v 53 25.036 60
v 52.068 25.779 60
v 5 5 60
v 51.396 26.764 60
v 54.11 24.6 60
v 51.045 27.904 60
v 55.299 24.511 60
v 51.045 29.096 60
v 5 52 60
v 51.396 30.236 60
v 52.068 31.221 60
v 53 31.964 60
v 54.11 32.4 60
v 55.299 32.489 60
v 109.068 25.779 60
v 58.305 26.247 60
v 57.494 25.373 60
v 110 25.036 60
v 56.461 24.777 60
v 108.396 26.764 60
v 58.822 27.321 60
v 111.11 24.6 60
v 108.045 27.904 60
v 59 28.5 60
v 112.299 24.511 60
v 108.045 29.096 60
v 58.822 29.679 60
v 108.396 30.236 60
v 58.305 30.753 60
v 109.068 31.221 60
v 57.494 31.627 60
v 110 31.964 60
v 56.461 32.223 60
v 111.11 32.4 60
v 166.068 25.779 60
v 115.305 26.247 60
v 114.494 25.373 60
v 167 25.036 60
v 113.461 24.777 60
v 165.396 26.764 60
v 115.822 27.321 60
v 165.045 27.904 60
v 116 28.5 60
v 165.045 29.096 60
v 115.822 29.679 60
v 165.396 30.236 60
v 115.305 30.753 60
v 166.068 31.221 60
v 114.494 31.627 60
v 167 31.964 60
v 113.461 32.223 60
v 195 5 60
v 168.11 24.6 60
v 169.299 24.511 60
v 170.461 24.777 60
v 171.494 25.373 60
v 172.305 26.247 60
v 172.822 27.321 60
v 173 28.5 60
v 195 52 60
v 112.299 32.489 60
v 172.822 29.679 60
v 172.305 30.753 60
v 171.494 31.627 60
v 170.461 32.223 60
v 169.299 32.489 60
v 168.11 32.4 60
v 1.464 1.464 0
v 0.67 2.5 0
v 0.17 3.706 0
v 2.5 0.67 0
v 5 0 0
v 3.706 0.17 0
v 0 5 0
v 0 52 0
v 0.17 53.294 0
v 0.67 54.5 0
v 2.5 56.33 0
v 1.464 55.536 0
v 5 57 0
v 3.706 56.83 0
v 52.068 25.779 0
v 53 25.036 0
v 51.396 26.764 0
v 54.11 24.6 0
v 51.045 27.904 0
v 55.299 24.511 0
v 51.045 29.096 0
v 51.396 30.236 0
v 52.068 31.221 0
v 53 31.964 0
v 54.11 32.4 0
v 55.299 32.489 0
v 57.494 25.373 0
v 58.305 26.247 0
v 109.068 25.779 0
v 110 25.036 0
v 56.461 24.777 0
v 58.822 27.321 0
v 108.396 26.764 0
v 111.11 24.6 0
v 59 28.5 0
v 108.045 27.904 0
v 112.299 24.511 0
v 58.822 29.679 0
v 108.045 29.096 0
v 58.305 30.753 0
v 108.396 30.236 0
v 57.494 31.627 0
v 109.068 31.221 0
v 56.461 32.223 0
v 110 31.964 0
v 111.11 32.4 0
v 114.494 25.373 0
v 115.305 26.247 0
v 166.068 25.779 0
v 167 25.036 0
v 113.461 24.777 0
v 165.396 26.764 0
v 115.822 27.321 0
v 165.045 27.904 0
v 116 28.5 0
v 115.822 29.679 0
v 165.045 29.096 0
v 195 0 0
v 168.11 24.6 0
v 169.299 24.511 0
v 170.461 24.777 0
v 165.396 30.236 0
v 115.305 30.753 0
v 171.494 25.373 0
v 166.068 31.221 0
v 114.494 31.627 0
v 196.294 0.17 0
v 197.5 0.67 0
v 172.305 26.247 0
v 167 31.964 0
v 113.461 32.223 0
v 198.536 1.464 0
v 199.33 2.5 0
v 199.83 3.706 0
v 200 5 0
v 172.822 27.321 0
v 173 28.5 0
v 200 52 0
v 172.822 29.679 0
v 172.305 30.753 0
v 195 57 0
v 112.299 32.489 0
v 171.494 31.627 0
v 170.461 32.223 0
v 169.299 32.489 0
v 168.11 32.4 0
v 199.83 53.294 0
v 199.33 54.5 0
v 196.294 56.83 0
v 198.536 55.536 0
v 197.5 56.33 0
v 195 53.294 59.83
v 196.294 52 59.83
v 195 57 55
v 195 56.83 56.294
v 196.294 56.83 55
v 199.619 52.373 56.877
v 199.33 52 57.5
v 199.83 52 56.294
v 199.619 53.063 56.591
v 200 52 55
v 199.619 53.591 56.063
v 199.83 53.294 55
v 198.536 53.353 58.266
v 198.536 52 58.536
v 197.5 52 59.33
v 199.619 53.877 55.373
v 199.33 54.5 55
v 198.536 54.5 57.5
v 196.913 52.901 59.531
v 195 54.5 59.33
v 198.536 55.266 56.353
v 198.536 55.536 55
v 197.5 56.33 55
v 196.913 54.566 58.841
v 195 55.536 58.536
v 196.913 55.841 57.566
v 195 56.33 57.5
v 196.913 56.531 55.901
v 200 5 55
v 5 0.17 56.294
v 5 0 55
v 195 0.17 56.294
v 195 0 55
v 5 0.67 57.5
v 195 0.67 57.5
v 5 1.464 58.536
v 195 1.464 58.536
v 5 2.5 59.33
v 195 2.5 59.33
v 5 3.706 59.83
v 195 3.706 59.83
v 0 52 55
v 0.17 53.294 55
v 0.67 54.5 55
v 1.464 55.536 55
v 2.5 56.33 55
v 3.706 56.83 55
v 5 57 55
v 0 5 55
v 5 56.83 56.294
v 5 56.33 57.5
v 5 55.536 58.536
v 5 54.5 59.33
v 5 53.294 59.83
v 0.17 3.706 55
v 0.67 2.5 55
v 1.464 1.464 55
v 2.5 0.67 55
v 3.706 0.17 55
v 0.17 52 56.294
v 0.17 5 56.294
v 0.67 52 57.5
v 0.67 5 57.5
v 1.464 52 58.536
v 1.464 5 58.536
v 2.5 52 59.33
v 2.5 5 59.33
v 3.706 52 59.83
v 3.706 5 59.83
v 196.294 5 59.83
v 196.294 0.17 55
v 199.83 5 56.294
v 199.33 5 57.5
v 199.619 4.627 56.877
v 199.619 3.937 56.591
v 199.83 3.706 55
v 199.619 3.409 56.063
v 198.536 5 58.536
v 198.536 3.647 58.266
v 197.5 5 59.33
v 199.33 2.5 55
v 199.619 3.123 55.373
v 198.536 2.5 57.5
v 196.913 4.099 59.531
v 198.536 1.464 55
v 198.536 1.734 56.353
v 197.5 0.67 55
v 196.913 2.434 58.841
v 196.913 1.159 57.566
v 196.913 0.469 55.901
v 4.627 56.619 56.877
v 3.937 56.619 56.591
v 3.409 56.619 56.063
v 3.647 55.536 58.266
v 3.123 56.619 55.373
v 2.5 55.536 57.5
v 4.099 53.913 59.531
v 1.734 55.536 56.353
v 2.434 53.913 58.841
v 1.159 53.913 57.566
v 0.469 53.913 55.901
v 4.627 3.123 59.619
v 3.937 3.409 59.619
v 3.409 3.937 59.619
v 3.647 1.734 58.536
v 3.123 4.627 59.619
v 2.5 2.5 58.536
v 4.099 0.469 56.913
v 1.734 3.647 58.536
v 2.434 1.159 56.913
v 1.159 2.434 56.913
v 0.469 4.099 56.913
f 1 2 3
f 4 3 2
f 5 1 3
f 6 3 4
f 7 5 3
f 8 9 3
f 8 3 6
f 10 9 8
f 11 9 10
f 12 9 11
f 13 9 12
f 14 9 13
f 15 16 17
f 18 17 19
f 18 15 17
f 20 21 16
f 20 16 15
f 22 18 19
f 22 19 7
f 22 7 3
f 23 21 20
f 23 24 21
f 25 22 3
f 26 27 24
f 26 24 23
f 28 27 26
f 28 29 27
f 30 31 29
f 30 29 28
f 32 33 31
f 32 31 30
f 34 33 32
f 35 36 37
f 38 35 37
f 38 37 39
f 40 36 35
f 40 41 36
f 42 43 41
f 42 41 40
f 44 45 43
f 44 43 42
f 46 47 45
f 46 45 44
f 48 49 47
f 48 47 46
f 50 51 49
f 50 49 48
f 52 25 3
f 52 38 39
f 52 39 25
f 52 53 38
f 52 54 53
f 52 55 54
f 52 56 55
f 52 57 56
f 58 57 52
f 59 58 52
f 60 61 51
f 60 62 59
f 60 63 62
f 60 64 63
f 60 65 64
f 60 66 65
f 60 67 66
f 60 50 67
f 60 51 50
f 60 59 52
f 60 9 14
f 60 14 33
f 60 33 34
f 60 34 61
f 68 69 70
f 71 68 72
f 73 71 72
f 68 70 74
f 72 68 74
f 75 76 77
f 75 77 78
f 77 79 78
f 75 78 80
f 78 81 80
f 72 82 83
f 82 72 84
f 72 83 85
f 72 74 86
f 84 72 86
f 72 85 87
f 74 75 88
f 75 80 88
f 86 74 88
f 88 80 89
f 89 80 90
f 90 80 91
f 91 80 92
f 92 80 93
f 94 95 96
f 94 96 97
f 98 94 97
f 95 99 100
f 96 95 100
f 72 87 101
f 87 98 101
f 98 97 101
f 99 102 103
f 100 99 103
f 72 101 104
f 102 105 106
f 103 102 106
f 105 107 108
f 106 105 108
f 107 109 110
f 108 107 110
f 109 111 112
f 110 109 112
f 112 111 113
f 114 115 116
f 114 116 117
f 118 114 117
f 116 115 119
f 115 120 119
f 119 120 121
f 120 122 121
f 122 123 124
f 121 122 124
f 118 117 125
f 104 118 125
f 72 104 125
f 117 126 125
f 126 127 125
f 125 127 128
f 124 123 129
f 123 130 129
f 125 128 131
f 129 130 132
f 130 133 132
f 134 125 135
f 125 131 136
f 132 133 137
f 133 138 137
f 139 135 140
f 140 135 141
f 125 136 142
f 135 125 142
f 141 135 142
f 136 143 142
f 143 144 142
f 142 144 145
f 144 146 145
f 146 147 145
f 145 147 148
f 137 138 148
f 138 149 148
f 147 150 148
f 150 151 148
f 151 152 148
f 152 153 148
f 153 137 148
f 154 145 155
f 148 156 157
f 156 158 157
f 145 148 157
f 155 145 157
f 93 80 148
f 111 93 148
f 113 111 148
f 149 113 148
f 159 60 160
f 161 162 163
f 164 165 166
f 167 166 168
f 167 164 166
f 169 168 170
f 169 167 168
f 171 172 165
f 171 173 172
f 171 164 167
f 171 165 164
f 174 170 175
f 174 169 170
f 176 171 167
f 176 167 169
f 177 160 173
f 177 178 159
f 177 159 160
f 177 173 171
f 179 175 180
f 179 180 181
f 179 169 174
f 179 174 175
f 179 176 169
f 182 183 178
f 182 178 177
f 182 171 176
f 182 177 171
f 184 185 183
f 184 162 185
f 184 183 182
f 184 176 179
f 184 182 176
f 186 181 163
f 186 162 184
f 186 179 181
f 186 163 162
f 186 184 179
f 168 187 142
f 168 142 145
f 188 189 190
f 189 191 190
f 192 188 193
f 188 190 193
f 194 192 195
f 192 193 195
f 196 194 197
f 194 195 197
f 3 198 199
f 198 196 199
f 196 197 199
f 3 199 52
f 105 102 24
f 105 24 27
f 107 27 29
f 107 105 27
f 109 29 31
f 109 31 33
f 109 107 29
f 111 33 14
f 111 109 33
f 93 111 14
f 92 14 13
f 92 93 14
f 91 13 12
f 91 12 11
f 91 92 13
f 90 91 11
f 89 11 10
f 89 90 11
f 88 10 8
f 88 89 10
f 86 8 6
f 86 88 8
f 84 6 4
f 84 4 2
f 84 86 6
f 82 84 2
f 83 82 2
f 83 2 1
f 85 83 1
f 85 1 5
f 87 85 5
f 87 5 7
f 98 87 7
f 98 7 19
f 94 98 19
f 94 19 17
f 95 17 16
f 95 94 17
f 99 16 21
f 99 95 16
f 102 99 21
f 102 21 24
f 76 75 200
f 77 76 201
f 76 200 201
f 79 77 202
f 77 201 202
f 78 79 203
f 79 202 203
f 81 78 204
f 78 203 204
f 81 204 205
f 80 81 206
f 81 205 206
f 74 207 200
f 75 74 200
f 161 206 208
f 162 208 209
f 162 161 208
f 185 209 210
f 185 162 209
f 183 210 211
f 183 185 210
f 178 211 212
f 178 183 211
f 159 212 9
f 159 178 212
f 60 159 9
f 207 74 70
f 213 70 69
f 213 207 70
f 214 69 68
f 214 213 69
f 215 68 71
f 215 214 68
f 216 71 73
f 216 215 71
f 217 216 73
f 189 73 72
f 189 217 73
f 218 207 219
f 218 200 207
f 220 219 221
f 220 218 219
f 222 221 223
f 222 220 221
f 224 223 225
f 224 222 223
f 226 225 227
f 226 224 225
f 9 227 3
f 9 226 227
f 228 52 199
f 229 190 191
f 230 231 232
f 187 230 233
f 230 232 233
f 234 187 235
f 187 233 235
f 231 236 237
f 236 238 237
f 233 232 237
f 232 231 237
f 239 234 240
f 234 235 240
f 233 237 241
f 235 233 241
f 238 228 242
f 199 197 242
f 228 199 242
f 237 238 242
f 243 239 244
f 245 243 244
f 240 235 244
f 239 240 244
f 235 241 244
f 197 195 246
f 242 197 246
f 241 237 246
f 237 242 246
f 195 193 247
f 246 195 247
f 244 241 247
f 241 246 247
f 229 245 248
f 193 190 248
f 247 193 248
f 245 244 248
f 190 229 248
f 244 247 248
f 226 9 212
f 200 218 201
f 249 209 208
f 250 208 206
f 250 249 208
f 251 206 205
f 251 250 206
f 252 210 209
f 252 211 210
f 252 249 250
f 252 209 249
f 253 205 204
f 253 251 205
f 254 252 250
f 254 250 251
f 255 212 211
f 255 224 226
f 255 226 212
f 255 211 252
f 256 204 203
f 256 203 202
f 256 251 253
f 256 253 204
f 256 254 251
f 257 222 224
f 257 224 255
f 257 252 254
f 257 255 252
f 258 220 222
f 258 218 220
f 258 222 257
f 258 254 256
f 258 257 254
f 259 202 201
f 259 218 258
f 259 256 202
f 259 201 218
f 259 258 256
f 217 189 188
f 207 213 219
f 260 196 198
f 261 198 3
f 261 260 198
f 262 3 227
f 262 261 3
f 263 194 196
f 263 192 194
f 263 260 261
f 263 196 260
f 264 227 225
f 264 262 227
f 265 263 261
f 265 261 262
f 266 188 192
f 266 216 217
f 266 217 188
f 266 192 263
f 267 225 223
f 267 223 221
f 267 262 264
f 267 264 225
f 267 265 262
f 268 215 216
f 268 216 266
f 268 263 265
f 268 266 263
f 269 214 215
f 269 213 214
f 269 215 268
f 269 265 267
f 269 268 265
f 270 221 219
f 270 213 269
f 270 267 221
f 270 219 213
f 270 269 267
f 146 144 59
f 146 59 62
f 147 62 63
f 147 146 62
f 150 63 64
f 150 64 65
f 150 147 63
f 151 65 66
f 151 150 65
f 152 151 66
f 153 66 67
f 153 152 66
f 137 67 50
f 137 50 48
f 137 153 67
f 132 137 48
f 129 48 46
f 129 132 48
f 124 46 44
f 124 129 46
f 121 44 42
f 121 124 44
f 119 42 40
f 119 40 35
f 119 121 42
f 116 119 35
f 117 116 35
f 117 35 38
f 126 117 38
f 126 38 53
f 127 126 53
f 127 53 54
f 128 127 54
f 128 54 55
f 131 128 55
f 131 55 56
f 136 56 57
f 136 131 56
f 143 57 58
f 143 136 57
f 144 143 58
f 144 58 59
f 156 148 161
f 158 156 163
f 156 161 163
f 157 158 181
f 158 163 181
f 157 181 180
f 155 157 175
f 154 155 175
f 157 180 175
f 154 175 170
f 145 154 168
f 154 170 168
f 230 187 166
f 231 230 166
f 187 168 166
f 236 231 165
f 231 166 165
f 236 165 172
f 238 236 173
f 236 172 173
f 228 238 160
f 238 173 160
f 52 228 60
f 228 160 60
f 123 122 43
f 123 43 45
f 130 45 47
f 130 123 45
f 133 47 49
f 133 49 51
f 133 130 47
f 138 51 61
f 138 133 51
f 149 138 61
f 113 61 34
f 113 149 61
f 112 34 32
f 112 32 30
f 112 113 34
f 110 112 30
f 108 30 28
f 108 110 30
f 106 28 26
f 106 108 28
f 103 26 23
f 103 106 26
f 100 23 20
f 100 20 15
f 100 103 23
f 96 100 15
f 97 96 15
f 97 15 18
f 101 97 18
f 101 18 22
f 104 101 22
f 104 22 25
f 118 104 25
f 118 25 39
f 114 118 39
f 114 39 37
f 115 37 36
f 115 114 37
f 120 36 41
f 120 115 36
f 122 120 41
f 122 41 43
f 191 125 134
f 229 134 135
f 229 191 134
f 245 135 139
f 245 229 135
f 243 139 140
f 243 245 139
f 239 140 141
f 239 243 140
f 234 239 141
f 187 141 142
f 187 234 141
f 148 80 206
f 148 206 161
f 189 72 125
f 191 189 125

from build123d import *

# Parameters (mm, degrees)
F0_W     = 200
F0_H     = 57
F0_R     = 4
F1_DEPTH = 60
F2_R     = 5


with BuildPart() as f1:
    # F0 (on Top) → F1 (new body)
    with BuildSketch(Plane.XY):
        with Locations((100, 28.5)):
            Rectangle(F0_W, F0_H)
        with Locations((55, 28.5)):
            Circle(F0_R, mode=Mode.SUBTRACT)
        with Locations((112, 28.5)):
            Circle(F0_R, mode=Mode.SUBTRACT)
        with Locations((169, 28.5)):
            Circle(F0_R, mode=Mode.SUBTRACT)
    extrude(amount=F1_DEPTH)

    # F2
    f2_edges = [f1.edges().sort_by_distance(p)[0] for p in [
        (0, 0, 30),
        (100, 0, 60),
        (0, 28.5, 60),
        (100, 57, 60),
        (200, 28.5, 60),
        (200, 0, 30),
        (200, 57, 30),
        (0, 57, 30),
    ]]
    fillet(f2_edges, radius=F2_R)


solid = f1.part
